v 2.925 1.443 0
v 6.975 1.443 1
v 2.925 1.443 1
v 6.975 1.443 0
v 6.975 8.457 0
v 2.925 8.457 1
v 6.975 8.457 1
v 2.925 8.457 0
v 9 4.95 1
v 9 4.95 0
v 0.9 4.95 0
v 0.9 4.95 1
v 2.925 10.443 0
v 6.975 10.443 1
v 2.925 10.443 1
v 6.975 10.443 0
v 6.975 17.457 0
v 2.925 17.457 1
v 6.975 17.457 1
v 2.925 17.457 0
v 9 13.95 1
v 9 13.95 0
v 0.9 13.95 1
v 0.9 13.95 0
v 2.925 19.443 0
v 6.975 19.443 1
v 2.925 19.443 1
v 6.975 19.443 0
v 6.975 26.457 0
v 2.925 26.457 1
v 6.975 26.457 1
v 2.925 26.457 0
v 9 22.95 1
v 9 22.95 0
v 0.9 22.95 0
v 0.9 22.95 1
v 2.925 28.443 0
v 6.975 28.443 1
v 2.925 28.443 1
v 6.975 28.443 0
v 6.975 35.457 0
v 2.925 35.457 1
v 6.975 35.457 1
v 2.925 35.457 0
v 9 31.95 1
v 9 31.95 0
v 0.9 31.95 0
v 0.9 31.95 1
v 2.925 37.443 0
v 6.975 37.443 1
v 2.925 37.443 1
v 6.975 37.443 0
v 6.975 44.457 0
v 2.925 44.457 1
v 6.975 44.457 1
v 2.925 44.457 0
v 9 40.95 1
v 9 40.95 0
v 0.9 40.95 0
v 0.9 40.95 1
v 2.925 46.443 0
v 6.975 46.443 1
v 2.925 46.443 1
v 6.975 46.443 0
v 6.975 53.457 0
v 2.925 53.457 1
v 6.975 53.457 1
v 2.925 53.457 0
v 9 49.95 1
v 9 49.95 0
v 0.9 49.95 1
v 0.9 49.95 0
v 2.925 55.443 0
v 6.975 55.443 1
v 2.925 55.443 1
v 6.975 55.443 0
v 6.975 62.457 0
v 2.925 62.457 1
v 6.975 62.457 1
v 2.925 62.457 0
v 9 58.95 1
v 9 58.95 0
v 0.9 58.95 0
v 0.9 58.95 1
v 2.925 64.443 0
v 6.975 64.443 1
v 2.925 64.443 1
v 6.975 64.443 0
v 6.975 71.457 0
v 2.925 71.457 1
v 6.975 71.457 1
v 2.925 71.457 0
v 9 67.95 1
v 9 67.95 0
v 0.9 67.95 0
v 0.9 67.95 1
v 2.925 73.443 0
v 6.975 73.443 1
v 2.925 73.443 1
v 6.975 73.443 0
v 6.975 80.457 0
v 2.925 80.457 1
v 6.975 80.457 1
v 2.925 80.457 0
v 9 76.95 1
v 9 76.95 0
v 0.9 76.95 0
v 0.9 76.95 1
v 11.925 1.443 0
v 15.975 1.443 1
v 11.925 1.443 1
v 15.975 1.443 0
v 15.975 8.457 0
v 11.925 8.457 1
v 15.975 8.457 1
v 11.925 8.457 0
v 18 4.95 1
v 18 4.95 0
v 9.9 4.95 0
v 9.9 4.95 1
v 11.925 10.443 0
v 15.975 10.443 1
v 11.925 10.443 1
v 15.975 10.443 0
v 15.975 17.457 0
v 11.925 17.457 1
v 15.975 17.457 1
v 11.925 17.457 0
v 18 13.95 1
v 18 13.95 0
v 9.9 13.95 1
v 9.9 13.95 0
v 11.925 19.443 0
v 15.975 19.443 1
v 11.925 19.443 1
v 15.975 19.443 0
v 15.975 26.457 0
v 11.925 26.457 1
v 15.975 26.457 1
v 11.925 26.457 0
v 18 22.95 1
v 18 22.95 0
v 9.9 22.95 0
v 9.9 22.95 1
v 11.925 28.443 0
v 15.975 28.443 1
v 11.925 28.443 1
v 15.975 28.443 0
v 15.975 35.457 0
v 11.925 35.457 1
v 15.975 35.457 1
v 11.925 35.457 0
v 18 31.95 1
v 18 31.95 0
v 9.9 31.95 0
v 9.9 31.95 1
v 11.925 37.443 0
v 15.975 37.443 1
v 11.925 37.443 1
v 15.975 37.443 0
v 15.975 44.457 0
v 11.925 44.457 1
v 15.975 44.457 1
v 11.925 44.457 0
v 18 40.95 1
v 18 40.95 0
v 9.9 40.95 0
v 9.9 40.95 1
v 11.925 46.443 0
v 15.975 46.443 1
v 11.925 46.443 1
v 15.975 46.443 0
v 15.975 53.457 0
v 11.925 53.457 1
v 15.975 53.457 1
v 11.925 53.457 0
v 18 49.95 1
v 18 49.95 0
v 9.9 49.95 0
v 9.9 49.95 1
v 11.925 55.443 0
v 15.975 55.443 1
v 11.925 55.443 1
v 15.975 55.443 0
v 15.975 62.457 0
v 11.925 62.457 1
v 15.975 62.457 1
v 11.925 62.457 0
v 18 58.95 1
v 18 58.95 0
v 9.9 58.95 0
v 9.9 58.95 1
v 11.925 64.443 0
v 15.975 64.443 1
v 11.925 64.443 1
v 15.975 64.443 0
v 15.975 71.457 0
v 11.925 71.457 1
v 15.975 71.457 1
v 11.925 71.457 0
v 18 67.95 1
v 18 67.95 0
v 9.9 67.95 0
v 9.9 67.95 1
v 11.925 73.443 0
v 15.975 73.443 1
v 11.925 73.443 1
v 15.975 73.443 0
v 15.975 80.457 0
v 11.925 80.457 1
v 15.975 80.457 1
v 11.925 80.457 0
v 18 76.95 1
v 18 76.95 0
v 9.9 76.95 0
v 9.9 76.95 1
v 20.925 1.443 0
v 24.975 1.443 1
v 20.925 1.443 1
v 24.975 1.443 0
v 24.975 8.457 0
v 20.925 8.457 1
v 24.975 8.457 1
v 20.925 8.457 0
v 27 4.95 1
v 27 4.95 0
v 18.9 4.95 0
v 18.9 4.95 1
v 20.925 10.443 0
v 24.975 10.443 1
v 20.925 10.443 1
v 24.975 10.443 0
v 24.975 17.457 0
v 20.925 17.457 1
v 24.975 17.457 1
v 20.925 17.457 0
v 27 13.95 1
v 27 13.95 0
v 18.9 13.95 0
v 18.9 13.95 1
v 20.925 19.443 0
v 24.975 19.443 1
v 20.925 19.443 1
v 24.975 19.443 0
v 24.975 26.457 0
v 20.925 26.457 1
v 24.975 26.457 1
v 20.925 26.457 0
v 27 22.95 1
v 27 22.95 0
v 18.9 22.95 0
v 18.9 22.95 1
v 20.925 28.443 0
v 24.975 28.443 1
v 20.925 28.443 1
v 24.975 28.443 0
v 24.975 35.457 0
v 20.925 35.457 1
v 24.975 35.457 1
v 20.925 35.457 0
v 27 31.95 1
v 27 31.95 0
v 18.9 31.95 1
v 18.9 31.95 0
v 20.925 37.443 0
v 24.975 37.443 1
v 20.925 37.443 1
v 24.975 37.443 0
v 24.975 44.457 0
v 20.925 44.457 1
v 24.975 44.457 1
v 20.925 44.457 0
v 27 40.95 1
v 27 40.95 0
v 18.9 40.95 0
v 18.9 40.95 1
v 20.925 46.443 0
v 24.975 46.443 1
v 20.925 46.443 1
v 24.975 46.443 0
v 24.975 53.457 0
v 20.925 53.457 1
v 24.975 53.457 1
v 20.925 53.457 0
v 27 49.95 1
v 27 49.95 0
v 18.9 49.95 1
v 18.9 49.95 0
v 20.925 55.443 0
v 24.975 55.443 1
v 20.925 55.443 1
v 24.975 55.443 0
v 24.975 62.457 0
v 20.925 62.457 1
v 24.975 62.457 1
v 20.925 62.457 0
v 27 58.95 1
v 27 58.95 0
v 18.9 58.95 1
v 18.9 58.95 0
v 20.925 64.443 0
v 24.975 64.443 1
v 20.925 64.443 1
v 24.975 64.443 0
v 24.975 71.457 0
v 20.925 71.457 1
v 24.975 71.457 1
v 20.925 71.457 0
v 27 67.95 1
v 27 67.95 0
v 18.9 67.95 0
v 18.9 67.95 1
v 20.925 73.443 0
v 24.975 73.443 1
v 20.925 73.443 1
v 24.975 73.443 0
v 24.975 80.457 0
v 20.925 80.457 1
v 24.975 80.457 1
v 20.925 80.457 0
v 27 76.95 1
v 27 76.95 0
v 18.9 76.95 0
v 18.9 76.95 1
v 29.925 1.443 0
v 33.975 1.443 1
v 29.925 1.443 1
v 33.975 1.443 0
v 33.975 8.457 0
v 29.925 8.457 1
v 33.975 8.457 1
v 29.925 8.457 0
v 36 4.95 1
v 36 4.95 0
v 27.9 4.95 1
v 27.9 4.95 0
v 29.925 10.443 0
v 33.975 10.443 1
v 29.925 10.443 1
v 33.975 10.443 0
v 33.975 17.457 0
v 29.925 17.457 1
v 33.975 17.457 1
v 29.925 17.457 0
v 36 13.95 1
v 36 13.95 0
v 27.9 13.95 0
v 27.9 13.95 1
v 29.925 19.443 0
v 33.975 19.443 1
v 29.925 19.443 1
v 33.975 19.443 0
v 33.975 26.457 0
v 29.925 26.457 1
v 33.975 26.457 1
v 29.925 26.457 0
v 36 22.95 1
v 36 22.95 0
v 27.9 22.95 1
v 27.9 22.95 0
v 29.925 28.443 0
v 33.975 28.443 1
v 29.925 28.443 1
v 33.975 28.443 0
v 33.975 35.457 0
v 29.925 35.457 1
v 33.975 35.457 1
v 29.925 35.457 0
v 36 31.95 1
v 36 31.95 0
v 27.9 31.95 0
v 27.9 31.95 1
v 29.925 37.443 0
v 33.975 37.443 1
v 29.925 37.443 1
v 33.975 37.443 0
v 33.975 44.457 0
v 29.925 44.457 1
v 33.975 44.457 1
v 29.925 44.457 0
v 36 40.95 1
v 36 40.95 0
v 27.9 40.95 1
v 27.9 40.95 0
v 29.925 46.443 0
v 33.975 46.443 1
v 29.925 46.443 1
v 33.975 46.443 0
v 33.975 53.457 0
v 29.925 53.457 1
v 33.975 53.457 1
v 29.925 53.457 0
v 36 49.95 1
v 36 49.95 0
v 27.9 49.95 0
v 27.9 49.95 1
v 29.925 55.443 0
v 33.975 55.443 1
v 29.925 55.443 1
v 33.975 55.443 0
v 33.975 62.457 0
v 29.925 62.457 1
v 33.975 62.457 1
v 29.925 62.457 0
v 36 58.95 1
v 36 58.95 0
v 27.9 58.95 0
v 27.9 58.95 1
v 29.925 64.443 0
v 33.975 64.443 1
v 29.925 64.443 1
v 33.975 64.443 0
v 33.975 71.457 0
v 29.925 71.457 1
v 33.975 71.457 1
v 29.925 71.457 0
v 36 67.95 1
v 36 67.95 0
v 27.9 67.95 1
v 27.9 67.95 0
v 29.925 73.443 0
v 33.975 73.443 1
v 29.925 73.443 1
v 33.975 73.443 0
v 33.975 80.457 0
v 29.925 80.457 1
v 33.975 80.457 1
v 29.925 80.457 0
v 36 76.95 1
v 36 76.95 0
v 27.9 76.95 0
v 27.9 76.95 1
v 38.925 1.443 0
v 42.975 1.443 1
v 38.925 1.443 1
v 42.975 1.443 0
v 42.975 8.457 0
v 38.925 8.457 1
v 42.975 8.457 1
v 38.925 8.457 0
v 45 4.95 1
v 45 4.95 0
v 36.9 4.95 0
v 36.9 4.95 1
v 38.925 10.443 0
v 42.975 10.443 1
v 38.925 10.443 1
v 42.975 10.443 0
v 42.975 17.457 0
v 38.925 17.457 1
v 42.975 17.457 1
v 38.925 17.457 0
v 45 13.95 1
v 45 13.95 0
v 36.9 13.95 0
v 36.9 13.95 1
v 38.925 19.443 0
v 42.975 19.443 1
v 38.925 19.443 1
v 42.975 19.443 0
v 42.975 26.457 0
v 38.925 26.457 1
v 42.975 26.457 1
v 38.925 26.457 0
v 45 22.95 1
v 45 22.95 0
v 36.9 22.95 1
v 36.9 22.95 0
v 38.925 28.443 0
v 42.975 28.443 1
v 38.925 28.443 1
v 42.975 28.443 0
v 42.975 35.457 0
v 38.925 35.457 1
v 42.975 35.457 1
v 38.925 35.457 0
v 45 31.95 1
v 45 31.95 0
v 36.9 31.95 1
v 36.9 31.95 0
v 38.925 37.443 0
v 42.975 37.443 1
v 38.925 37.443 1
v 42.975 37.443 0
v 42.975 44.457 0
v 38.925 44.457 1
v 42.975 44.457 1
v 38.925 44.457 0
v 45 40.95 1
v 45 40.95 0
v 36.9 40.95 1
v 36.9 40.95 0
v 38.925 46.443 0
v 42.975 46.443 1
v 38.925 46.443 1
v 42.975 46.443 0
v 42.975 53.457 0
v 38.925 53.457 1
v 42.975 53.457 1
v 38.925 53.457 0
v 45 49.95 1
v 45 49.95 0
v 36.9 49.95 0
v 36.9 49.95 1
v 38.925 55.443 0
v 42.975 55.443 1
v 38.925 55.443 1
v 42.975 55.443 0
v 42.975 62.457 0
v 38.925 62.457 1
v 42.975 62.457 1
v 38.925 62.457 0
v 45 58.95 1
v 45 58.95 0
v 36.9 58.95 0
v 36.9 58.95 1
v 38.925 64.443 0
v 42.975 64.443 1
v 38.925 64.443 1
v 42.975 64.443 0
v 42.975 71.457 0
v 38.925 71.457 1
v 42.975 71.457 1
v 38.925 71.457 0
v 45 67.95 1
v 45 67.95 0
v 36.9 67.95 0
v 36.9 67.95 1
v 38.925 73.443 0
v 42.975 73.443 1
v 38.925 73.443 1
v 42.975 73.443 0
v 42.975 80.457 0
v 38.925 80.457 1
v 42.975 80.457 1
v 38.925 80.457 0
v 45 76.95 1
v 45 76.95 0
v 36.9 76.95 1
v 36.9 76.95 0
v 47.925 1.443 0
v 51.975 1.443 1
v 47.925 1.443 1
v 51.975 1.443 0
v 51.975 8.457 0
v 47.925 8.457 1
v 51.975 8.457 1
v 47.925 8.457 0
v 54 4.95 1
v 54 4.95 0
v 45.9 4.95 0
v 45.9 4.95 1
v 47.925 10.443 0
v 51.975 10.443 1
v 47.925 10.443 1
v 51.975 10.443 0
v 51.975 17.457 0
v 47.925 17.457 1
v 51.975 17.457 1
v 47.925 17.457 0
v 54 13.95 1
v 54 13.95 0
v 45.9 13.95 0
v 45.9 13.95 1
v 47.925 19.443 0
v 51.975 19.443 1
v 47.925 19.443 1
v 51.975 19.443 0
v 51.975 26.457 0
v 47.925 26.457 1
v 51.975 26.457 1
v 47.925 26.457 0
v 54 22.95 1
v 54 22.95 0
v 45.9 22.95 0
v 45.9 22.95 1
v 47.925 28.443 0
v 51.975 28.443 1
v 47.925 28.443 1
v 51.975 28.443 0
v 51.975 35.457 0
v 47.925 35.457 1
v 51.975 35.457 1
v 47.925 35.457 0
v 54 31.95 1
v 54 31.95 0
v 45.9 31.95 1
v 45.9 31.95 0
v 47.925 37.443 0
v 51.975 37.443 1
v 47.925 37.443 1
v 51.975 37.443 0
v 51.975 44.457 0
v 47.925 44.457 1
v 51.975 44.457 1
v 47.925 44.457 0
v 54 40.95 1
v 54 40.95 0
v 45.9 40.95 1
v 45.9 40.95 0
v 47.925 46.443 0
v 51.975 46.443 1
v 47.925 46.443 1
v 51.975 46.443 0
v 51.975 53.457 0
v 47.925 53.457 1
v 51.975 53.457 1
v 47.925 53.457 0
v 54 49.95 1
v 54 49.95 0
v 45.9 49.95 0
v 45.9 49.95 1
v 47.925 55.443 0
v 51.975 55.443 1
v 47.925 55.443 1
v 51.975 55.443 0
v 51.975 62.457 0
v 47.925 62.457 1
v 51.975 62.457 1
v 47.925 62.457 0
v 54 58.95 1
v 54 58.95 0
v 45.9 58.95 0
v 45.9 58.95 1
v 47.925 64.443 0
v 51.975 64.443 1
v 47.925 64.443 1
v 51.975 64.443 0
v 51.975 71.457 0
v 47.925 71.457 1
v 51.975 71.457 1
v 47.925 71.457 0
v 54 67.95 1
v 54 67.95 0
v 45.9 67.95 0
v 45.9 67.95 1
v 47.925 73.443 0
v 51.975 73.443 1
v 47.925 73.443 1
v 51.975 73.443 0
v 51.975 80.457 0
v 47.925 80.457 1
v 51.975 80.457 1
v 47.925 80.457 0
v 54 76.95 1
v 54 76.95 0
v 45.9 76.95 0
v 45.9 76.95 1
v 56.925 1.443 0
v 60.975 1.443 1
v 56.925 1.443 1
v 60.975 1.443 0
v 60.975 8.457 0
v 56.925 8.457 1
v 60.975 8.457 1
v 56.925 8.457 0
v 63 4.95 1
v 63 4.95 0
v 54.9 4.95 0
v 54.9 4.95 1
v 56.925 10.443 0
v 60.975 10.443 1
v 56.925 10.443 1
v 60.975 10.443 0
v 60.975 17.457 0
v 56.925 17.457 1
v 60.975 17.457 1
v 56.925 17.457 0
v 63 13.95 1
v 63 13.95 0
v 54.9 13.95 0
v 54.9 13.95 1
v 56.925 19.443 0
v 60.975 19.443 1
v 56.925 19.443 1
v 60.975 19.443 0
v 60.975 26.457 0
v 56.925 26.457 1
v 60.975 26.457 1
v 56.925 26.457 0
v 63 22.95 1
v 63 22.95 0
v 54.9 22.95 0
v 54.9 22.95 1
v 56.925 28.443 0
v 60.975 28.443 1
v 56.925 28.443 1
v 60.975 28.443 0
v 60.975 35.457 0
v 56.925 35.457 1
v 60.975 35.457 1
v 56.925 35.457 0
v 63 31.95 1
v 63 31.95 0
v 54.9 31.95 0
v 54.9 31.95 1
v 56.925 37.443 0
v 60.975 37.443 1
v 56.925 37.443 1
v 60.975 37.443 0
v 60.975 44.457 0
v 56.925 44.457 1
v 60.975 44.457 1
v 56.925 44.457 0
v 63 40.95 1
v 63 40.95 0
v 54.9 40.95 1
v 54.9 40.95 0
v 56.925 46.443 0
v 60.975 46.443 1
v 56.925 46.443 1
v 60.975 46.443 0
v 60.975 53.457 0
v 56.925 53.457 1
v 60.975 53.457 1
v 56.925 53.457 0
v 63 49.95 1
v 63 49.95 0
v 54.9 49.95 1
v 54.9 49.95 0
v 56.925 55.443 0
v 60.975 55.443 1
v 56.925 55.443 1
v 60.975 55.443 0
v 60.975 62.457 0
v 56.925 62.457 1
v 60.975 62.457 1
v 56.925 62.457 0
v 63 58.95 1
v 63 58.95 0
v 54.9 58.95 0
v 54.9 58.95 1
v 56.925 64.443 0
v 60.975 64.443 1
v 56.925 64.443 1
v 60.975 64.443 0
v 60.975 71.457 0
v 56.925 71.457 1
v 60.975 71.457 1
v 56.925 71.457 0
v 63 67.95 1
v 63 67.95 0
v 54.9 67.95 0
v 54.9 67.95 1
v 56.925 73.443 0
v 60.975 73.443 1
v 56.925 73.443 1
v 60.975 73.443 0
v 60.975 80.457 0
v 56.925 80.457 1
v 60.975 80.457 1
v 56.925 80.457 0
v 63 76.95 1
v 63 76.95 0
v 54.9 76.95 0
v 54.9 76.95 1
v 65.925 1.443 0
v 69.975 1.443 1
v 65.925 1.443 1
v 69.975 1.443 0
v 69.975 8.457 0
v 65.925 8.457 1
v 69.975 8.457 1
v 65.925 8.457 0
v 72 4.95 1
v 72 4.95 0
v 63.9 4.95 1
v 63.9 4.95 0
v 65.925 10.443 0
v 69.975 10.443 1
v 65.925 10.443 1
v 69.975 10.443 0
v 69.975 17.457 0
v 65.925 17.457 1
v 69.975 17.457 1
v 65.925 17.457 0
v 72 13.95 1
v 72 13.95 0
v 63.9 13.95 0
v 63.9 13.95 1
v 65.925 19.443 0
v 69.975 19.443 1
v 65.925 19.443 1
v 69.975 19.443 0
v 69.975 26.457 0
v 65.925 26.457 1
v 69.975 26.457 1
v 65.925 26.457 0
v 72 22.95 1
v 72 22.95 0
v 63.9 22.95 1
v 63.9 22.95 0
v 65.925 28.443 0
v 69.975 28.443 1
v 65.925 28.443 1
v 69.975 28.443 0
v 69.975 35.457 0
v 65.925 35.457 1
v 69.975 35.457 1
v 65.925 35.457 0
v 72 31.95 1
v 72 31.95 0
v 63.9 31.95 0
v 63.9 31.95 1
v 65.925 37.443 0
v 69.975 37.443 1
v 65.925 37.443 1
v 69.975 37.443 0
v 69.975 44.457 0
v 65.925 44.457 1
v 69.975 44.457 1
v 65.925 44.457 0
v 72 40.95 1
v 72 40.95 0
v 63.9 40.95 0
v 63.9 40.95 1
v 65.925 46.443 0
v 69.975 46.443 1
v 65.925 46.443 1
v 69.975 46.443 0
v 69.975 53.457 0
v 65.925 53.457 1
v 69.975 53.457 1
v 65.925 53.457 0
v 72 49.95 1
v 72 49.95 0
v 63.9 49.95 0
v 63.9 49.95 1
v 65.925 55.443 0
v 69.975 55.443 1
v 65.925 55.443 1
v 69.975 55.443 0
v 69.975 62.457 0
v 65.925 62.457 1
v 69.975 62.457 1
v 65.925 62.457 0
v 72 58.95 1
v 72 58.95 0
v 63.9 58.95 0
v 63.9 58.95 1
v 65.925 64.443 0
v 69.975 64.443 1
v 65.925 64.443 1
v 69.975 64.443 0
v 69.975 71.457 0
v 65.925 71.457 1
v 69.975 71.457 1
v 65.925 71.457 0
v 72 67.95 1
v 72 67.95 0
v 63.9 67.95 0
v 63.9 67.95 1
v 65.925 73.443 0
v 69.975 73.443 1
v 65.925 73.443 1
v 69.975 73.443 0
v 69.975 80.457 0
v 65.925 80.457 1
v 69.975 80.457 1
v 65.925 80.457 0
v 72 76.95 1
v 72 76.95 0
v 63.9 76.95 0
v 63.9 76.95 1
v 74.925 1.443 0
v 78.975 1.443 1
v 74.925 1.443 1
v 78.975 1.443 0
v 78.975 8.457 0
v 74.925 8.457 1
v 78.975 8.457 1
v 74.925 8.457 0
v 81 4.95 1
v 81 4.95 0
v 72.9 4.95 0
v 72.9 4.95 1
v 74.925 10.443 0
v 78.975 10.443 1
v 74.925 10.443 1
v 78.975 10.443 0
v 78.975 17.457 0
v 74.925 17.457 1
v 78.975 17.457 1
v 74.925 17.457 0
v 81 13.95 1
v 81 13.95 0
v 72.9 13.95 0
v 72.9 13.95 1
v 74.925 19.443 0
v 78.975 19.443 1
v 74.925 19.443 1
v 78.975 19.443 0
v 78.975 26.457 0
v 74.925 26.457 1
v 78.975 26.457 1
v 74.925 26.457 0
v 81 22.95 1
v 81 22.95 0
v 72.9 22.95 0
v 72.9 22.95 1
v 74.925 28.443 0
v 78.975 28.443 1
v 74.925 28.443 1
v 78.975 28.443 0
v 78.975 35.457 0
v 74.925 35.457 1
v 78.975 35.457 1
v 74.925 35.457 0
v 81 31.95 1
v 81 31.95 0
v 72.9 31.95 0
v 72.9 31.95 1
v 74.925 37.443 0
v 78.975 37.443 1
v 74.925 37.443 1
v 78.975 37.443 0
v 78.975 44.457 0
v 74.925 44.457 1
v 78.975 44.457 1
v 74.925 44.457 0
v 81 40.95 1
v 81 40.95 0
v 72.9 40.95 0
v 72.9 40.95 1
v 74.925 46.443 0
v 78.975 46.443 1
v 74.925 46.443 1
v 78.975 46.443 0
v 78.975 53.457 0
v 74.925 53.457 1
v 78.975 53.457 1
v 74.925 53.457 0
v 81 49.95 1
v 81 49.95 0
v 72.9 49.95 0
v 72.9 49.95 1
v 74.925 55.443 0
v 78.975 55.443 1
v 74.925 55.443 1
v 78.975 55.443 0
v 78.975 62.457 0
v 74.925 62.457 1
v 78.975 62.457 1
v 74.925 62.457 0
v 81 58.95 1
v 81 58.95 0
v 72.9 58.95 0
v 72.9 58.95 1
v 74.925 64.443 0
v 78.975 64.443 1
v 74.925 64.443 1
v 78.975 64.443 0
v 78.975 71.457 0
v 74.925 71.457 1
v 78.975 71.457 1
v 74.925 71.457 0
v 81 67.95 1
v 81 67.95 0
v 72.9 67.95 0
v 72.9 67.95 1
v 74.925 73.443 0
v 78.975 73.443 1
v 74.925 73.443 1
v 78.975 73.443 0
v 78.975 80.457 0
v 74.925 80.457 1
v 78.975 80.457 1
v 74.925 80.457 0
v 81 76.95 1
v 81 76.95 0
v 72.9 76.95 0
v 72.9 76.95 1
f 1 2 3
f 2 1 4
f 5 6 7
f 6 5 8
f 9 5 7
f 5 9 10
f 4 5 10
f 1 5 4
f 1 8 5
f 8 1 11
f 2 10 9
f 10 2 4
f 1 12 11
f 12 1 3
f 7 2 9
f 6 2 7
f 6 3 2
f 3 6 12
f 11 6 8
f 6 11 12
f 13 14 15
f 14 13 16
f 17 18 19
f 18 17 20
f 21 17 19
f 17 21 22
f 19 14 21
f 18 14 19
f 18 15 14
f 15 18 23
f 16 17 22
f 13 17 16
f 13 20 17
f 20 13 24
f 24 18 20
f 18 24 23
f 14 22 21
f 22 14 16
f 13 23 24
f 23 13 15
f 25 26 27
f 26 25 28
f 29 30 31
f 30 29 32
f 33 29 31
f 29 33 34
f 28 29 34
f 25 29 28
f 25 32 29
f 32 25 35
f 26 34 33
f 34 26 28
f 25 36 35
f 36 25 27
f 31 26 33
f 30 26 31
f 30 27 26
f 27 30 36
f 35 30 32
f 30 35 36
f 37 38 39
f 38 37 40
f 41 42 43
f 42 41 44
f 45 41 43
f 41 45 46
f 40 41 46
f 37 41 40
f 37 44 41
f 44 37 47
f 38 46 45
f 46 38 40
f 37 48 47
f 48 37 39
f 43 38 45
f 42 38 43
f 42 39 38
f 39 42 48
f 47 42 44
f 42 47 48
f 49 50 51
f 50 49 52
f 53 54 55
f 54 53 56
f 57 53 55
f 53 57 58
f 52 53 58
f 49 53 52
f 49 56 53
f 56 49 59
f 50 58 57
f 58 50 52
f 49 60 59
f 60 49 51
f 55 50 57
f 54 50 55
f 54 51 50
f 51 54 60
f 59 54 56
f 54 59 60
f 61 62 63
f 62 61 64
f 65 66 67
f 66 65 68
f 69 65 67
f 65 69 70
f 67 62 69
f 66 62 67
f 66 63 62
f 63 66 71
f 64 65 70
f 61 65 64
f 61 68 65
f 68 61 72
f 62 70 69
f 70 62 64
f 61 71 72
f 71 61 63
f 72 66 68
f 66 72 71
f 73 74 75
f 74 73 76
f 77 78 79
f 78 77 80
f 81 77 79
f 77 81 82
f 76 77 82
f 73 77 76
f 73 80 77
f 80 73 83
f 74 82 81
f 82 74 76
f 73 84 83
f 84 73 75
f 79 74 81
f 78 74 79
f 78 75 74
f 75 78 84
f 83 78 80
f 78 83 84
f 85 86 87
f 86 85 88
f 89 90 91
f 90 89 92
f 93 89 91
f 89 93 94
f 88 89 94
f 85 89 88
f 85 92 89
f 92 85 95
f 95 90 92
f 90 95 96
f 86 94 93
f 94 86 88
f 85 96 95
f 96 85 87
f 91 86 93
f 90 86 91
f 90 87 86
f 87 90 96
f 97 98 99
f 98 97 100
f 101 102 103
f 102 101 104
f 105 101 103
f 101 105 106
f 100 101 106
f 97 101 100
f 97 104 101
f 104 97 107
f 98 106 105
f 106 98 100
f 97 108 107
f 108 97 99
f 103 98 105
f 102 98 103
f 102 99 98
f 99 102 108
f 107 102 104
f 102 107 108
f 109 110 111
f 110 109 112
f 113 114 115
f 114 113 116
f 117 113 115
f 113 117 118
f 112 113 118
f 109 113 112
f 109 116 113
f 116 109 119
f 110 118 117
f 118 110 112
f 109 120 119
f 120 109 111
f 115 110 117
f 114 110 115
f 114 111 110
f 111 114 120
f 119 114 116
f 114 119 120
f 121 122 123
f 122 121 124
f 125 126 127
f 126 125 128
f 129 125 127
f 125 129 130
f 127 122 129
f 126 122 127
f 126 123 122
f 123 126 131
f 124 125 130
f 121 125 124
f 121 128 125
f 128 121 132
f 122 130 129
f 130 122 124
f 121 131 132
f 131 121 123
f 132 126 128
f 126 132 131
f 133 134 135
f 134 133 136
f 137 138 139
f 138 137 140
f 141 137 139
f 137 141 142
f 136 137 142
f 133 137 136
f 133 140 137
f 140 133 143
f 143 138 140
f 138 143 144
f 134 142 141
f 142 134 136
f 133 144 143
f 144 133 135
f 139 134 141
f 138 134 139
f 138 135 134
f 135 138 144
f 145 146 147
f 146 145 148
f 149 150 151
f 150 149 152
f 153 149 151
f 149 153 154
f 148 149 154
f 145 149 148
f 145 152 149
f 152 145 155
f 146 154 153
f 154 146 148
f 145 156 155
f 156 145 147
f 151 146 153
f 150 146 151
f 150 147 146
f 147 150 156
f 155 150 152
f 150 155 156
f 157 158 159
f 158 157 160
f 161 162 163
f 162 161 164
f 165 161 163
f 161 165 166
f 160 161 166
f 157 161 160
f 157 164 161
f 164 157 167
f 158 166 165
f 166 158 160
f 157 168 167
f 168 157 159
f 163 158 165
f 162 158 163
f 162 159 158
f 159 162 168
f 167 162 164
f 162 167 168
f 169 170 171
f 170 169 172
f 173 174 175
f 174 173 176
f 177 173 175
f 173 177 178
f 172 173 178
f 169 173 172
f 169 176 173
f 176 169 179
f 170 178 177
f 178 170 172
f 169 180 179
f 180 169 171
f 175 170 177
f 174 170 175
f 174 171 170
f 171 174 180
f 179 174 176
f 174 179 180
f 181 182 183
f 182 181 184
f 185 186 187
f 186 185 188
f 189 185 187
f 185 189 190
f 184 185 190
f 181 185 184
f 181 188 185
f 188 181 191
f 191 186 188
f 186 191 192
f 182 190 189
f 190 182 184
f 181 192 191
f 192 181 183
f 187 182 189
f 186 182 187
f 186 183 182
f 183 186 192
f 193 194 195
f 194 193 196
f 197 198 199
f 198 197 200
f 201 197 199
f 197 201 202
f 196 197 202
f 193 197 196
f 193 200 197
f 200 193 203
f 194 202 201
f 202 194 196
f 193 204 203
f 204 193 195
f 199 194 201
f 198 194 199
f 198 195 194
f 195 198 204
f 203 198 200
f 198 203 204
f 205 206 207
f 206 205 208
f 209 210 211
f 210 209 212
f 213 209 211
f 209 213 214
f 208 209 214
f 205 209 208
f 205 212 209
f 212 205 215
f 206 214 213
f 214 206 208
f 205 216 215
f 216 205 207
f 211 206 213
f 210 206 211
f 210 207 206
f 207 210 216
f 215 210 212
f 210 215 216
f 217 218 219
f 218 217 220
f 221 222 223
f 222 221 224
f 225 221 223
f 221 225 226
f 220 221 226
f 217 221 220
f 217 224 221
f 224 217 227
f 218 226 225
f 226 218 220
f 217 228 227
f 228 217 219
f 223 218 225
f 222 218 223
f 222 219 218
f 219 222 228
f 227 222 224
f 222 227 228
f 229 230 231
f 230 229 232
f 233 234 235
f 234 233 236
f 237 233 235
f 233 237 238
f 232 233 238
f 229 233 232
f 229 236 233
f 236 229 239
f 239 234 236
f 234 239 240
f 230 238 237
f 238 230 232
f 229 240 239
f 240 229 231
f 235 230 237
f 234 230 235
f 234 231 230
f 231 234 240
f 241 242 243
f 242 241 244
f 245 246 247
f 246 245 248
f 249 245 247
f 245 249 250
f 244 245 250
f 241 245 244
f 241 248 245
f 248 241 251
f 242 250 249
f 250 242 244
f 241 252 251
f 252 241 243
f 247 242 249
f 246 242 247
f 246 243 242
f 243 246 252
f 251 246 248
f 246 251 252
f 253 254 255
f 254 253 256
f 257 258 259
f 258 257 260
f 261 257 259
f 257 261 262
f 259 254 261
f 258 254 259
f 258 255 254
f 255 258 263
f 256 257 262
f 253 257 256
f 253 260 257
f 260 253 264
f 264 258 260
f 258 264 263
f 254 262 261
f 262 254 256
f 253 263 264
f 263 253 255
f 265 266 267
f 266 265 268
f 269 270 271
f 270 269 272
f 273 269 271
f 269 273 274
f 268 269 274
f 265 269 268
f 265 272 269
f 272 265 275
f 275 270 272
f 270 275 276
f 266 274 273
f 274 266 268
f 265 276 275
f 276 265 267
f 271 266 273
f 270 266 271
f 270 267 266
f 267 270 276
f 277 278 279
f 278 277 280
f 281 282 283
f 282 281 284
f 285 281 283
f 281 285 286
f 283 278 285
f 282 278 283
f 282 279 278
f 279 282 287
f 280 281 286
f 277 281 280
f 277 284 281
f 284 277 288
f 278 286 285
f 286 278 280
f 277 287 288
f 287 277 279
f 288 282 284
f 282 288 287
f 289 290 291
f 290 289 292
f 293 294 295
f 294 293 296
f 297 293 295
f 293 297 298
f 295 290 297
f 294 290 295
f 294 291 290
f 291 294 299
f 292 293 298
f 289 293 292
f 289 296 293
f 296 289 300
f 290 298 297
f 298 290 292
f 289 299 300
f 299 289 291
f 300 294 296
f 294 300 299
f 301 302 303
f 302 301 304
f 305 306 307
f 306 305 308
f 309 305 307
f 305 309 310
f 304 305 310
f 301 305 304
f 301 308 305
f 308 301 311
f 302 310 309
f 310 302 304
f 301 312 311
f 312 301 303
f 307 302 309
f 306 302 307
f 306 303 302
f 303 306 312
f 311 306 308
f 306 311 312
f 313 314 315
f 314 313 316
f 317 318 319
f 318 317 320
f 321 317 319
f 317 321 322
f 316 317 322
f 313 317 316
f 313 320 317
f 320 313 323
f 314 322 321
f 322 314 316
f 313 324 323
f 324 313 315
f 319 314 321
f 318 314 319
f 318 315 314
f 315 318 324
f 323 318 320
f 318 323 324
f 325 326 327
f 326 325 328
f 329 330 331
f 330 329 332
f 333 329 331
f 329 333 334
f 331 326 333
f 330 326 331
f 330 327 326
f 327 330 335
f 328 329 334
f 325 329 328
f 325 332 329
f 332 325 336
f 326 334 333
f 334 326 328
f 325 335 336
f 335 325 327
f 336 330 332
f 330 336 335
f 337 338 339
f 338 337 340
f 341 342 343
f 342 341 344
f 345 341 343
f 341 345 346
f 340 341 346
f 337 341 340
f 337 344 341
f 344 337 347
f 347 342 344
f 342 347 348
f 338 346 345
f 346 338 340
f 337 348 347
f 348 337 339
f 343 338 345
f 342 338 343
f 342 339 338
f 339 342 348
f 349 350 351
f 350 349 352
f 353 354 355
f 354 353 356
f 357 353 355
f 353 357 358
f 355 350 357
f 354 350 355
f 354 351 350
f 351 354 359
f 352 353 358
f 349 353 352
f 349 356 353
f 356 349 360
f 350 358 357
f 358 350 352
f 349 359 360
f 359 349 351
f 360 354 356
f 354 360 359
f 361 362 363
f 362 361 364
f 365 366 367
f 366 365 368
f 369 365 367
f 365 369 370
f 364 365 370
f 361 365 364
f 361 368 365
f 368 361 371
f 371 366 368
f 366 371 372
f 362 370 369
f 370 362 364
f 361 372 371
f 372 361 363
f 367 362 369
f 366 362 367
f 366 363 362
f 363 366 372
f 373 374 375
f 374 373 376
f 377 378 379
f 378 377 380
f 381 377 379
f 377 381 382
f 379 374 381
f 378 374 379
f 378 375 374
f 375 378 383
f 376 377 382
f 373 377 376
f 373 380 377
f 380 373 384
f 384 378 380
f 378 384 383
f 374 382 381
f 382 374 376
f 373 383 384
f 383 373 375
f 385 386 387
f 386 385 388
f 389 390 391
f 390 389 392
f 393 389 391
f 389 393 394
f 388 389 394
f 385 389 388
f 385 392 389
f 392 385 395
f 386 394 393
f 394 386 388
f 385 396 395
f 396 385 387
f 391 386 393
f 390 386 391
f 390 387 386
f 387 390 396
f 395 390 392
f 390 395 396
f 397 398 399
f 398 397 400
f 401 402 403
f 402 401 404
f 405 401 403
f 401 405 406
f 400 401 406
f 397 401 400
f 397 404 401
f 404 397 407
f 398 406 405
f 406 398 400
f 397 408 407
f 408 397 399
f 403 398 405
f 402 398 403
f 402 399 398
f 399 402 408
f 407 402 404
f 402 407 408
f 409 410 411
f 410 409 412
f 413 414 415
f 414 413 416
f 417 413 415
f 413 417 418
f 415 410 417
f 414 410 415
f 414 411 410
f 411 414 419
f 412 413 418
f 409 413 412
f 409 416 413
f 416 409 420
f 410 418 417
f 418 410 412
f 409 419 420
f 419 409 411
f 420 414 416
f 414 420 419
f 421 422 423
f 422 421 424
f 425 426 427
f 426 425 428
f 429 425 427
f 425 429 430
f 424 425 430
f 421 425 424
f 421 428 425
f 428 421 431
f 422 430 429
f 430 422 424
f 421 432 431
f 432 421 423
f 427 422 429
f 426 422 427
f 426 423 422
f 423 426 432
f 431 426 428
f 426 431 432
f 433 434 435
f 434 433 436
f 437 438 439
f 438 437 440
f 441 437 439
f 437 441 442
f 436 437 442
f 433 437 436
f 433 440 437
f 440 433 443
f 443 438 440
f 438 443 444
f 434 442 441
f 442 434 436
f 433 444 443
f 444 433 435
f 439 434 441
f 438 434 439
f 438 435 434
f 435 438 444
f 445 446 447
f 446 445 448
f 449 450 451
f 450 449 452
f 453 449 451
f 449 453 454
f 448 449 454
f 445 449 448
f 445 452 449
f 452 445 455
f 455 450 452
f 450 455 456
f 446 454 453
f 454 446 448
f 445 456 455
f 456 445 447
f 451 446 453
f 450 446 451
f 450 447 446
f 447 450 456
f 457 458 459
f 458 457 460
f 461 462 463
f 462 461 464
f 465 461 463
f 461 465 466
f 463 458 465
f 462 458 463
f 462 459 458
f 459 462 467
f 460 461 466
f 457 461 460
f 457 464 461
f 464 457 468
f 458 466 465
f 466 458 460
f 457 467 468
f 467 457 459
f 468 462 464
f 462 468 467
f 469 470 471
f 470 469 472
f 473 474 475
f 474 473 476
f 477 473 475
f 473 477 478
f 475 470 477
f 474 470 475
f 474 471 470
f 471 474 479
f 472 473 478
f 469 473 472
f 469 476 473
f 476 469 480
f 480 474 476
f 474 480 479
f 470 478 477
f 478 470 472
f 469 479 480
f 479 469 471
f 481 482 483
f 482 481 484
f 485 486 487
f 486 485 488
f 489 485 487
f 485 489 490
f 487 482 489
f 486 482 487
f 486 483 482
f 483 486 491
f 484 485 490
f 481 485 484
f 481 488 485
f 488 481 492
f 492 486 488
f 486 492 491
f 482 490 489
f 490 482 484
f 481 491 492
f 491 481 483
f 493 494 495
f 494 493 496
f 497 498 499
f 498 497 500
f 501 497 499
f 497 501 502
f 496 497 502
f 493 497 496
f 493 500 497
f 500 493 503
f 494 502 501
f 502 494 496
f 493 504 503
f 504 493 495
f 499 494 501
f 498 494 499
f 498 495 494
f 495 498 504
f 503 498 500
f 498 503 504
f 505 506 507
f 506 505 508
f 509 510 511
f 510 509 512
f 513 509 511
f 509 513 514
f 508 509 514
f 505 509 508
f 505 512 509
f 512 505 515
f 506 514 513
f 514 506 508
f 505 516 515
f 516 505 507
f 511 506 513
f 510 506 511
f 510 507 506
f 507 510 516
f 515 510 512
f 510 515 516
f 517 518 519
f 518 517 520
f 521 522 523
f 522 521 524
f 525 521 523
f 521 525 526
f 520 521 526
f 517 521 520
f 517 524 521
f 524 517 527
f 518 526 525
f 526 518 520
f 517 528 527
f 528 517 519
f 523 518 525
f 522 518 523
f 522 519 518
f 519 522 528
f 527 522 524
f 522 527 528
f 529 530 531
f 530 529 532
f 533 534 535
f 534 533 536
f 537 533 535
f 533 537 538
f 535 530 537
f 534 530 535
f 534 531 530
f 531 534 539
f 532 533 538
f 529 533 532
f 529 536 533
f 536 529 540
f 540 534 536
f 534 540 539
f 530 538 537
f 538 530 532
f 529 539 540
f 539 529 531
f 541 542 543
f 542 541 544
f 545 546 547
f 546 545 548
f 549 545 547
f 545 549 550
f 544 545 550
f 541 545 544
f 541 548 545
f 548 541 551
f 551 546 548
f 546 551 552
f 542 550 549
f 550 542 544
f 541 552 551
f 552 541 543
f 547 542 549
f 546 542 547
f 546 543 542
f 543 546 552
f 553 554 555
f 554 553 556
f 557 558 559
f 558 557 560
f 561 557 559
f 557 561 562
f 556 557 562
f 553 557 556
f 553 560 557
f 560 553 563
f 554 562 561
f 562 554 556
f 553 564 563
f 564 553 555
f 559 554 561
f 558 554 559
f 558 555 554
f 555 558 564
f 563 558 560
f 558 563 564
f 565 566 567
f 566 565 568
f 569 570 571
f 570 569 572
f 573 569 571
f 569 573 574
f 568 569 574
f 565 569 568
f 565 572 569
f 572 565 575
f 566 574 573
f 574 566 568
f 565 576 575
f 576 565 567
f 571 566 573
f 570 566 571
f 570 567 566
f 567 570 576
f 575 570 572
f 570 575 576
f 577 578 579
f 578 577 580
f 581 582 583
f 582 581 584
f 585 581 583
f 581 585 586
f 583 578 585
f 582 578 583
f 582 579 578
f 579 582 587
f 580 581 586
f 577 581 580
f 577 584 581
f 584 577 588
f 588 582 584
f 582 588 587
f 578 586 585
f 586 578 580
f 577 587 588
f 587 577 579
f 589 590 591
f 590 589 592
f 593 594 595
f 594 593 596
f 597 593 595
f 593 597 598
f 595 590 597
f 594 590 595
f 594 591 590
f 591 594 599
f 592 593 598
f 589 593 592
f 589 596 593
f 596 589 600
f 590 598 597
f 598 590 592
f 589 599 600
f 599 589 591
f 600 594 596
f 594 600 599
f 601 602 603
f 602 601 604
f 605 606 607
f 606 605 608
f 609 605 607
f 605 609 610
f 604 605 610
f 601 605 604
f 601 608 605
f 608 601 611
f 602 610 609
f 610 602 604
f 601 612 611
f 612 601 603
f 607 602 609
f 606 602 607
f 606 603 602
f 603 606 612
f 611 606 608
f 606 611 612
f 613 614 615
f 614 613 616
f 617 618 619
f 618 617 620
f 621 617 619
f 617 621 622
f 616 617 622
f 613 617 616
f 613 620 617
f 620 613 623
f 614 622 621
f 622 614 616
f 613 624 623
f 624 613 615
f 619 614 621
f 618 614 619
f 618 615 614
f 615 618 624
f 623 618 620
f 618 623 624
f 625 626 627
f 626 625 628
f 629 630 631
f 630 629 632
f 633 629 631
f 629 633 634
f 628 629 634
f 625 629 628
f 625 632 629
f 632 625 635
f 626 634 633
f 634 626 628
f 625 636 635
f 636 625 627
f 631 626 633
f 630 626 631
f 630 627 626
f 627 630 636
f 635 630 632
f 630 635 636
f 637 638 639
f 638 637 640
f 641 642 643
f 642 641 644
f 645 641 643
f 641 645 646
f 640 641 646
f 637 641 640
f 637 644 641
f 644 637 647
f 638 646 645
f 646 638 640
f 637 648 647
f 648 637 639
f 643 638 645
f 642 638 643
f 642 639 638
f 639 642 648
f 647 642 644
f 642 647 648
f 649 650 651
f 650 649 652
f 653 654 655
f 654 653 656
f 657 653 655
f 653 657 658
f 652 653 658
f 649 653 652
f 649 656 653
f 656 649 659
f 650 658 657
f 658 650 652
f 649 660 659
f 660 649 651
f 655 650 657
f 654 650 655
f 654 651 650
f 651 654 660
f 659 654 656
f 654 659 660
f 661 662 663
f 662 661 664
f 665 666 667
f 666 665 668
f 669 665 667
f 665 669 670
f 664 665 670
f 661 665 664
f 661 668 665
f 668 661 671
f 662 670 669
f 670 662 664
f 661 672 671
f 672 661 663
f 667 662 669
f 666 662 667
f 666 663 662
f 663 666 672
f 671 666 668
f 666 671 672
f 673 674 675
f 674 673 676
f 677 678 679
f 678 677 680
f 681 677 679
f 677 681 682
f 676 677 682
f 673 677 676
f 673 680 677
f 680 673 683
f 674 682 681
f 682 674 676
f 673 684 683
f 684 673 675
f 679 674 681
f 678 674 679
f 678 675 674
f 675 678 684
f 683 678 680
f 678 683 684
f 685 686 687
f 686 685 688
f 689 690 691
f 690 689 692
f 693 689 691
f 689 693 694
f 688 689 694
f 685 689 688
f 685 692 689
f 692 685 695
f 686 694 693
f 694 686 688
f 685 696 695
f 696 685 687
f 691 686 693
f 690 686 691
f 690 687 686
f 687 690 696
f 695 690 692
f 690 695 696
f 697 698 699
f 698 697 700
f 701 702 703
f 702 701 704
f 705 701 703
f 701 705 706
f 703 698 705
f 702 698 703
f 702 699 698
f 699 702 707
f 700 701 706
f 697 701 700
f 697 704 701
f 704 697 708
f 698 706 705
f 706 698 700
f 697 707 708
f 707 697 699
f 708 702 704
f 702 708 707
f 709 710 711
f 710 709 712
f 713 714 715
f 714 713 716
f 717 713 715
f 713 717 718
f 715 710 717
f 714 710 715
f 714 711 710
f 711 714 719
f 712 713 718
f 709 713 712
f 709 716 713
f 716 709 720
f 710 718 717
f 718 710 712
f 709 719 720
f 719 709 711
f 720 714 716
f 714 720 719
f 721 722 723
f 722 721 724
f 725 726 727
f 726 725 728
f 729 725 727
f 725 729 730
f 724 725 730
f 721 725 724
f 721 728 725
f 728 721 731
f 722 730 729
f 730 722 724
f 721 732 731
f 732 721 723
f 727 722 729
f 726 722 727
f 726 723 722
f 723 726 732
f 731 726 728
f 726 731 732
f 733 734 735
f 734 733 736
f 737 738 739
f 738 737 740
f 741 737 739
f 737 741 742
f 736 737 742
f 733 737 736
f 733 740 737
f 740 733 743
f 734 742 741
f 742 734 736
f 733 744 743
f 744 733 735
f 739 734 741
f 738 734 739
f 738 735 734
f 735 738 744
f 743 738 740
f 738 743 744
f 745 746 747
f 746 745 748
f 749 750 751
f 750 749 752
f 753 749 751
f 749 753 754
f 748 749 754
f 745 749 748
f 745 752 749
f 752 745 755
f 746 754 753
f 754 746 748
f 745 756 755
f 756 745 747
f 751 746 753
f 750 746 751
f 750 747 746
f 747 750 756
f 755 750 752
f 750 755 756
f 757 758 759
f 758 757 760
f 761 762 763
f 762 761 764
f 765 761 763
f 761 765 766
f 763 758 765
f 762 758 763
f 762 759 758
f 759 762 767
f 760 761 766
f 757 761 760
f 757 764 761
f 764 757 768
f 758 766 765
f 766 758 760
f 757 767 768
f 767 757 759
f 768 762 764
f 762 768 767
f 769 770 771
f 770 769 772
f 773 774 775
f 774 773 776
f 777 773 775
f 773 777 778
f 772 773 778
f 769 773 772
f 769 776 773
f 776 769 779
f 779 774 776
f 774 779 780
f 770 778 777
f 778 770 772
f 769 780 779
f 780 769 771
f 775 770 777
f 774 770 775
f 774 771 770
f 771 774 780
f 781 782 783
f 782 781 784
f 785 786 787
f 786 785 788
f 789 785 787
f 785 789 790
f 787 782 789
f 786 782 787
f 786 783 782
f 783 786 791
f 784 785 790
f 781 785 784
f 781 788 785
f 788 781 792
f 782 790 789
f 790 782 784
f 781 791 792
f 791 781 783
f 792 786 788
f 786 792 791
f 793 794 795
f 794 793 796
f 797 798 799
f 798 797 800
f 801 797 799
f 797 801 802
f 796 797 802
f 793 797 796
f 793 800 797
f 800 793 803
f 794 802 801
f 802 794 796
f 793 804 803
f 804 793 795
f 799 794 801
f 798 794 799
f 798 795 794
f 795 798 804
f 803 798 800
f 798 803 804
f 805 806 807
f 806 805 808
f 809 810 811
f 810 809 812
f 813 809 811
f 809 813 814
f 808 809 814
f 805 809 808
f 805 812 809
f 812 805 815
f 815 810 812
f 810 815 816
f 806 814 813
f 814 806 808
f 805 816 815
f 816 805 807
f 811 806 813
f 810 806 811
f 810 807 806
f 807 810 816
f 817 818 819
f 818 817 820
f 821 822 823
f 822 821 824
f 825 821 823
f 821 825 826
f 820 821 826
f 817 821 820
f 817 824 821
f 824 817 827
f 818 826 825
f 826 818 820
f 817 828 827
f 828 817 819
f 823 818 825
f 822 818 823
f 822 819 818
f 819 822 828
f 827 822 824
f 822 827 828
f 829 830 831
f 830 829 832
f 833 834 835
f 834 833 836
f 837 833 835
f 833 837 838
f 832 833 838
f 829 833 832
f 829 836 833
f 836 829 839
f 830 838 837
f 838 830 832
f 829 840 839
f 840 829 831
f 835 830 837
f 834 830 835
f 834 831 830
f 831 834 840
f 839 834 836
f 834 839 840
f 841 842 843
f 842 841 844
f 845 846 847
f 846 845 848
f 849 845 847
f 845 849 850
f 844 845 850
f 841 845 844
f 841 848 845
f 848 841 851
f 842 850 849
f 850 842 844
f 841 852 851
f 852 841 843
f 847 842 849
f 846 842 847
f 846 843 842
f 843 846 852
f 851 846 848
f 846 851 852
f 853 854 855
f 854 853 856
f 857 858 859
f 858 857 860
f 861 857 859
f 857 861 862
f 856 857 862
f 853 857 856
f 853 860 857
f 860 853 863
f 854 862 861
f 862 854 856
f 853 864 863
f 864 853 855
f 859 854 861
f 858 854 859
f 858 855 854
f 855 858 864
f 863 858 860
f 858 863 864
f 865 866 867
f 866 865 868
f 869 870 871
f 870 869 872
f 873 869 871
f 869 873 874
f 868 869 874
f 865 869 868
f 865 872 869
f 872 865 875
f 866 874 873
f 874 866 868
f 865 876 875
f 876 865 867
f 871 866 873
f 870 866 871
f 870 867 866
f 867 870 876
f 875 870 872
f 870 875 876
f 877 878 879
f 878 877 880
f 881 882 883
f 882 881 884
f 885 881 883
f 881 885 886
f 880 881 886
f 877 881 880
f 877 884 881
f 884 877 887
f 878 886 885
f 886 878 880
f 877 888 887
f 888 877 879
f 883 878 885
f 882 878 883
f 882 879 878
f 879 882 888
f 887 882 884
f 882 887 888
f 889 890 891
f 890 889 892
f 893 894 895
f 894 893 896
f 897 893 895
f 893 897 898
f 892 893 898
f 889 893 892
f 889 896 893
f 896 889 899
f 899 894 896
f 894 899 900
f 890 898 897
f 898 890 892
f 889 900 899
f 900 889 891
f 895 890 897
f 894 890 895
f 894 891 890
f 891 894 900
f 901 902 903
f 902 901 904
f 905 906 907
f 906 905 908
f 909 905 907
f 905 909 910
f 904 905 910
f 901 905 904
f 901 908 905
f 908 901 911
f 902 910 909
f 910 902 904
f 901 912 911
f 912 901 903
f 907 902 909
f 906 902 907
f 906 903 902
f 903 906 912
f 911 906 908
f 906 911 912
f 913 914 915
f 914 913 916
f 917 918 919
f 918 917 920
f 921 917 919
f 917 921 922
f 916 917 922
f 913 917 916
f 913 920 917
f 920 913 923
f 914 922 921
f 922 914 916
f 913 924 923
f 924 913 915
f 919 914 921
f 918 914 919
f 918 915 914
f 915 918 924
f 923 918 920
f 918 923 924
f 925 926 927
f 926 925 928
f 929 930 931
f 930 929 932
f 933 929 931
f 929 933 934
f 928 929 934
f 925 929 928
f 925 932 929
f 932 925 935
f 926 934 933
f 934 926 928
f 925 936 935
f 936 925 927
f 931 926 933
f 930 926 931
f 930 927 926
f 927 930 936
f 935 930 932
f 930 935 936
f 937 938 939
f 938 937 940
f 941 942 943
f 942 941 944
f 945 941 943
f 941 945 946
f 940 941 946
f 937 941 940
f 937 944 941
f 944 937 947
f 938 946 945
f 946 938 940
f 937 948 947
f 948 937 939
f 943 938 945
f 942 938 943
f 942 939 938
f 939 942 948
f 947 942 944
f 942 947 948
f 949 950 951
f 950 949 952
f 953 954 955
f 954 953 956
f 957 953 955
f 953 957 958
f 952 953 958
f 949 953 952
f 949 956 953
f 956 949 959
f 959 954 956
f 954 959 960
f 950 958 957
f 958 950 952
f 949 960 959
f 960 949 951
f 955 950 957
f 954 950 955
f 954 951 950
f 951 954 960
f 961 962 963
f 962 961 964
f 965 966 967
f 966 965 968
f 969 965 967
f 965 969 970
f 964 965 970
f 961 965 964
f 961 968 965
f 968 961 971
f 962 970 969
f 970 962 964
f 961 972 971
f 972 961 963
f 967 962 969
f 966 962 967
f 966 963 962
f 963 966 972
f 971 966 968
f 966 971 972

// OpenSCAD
$fn=100;
sides = 6;;
spacing = 4;


hi=1;
rad=1;
dia=10;

module makeGrating(width, length, percent)
{
    choles = width  * percent/ 100;
    rholes = length * percent/ 100;
    dia = choles * 90 /100;
     echo ("xxxxxx", choles = choles, rholes = rholes, dia = dia);

    oneColumn = width * percent/100;
    oneRow = length * percent /100;
    
    // do not print row or column 0... fence post algorithm
    translate ([-dia/2, -dia/2, 0])
    {
        for (kolumn = [0: 1: choles])
        {
    
            if (kolumn)
            {
                column = kolumn *  oneColumn;;
                {
                    for (crow = [0: 1 : rholes])
                    {
                        row = crow * oneRow;
                        if (crow)
                        {
                            echo (kolumn = kolumn, column = column, crow = crow, row = row);
                            y = crow % 2 ? row : row;
                            x = kolumn % 2 ? column : column;

                            color( crow % 2 ? "RED" : "GREEN")
                            
                            //translate([kolumn % 2 ? column : column - oneColumn/2, crow % 2 ? row : row + oneRow/2, 0 ])
                            translate([x, y, 0 ])
                            //translate ( [ column, row, 0 ])
                            //rotate([0,0, ((kolumn + crow) % 2) ? 0 : 180/sides])
                            cylinder(hi, d=dia, true, $fn=sides);
                        }
                    }
                }
            }
        }
    }
     echo ( choles = choles, rholes = rholes, dia = dia);
   
}

makeGrating(30, 30, 30);
